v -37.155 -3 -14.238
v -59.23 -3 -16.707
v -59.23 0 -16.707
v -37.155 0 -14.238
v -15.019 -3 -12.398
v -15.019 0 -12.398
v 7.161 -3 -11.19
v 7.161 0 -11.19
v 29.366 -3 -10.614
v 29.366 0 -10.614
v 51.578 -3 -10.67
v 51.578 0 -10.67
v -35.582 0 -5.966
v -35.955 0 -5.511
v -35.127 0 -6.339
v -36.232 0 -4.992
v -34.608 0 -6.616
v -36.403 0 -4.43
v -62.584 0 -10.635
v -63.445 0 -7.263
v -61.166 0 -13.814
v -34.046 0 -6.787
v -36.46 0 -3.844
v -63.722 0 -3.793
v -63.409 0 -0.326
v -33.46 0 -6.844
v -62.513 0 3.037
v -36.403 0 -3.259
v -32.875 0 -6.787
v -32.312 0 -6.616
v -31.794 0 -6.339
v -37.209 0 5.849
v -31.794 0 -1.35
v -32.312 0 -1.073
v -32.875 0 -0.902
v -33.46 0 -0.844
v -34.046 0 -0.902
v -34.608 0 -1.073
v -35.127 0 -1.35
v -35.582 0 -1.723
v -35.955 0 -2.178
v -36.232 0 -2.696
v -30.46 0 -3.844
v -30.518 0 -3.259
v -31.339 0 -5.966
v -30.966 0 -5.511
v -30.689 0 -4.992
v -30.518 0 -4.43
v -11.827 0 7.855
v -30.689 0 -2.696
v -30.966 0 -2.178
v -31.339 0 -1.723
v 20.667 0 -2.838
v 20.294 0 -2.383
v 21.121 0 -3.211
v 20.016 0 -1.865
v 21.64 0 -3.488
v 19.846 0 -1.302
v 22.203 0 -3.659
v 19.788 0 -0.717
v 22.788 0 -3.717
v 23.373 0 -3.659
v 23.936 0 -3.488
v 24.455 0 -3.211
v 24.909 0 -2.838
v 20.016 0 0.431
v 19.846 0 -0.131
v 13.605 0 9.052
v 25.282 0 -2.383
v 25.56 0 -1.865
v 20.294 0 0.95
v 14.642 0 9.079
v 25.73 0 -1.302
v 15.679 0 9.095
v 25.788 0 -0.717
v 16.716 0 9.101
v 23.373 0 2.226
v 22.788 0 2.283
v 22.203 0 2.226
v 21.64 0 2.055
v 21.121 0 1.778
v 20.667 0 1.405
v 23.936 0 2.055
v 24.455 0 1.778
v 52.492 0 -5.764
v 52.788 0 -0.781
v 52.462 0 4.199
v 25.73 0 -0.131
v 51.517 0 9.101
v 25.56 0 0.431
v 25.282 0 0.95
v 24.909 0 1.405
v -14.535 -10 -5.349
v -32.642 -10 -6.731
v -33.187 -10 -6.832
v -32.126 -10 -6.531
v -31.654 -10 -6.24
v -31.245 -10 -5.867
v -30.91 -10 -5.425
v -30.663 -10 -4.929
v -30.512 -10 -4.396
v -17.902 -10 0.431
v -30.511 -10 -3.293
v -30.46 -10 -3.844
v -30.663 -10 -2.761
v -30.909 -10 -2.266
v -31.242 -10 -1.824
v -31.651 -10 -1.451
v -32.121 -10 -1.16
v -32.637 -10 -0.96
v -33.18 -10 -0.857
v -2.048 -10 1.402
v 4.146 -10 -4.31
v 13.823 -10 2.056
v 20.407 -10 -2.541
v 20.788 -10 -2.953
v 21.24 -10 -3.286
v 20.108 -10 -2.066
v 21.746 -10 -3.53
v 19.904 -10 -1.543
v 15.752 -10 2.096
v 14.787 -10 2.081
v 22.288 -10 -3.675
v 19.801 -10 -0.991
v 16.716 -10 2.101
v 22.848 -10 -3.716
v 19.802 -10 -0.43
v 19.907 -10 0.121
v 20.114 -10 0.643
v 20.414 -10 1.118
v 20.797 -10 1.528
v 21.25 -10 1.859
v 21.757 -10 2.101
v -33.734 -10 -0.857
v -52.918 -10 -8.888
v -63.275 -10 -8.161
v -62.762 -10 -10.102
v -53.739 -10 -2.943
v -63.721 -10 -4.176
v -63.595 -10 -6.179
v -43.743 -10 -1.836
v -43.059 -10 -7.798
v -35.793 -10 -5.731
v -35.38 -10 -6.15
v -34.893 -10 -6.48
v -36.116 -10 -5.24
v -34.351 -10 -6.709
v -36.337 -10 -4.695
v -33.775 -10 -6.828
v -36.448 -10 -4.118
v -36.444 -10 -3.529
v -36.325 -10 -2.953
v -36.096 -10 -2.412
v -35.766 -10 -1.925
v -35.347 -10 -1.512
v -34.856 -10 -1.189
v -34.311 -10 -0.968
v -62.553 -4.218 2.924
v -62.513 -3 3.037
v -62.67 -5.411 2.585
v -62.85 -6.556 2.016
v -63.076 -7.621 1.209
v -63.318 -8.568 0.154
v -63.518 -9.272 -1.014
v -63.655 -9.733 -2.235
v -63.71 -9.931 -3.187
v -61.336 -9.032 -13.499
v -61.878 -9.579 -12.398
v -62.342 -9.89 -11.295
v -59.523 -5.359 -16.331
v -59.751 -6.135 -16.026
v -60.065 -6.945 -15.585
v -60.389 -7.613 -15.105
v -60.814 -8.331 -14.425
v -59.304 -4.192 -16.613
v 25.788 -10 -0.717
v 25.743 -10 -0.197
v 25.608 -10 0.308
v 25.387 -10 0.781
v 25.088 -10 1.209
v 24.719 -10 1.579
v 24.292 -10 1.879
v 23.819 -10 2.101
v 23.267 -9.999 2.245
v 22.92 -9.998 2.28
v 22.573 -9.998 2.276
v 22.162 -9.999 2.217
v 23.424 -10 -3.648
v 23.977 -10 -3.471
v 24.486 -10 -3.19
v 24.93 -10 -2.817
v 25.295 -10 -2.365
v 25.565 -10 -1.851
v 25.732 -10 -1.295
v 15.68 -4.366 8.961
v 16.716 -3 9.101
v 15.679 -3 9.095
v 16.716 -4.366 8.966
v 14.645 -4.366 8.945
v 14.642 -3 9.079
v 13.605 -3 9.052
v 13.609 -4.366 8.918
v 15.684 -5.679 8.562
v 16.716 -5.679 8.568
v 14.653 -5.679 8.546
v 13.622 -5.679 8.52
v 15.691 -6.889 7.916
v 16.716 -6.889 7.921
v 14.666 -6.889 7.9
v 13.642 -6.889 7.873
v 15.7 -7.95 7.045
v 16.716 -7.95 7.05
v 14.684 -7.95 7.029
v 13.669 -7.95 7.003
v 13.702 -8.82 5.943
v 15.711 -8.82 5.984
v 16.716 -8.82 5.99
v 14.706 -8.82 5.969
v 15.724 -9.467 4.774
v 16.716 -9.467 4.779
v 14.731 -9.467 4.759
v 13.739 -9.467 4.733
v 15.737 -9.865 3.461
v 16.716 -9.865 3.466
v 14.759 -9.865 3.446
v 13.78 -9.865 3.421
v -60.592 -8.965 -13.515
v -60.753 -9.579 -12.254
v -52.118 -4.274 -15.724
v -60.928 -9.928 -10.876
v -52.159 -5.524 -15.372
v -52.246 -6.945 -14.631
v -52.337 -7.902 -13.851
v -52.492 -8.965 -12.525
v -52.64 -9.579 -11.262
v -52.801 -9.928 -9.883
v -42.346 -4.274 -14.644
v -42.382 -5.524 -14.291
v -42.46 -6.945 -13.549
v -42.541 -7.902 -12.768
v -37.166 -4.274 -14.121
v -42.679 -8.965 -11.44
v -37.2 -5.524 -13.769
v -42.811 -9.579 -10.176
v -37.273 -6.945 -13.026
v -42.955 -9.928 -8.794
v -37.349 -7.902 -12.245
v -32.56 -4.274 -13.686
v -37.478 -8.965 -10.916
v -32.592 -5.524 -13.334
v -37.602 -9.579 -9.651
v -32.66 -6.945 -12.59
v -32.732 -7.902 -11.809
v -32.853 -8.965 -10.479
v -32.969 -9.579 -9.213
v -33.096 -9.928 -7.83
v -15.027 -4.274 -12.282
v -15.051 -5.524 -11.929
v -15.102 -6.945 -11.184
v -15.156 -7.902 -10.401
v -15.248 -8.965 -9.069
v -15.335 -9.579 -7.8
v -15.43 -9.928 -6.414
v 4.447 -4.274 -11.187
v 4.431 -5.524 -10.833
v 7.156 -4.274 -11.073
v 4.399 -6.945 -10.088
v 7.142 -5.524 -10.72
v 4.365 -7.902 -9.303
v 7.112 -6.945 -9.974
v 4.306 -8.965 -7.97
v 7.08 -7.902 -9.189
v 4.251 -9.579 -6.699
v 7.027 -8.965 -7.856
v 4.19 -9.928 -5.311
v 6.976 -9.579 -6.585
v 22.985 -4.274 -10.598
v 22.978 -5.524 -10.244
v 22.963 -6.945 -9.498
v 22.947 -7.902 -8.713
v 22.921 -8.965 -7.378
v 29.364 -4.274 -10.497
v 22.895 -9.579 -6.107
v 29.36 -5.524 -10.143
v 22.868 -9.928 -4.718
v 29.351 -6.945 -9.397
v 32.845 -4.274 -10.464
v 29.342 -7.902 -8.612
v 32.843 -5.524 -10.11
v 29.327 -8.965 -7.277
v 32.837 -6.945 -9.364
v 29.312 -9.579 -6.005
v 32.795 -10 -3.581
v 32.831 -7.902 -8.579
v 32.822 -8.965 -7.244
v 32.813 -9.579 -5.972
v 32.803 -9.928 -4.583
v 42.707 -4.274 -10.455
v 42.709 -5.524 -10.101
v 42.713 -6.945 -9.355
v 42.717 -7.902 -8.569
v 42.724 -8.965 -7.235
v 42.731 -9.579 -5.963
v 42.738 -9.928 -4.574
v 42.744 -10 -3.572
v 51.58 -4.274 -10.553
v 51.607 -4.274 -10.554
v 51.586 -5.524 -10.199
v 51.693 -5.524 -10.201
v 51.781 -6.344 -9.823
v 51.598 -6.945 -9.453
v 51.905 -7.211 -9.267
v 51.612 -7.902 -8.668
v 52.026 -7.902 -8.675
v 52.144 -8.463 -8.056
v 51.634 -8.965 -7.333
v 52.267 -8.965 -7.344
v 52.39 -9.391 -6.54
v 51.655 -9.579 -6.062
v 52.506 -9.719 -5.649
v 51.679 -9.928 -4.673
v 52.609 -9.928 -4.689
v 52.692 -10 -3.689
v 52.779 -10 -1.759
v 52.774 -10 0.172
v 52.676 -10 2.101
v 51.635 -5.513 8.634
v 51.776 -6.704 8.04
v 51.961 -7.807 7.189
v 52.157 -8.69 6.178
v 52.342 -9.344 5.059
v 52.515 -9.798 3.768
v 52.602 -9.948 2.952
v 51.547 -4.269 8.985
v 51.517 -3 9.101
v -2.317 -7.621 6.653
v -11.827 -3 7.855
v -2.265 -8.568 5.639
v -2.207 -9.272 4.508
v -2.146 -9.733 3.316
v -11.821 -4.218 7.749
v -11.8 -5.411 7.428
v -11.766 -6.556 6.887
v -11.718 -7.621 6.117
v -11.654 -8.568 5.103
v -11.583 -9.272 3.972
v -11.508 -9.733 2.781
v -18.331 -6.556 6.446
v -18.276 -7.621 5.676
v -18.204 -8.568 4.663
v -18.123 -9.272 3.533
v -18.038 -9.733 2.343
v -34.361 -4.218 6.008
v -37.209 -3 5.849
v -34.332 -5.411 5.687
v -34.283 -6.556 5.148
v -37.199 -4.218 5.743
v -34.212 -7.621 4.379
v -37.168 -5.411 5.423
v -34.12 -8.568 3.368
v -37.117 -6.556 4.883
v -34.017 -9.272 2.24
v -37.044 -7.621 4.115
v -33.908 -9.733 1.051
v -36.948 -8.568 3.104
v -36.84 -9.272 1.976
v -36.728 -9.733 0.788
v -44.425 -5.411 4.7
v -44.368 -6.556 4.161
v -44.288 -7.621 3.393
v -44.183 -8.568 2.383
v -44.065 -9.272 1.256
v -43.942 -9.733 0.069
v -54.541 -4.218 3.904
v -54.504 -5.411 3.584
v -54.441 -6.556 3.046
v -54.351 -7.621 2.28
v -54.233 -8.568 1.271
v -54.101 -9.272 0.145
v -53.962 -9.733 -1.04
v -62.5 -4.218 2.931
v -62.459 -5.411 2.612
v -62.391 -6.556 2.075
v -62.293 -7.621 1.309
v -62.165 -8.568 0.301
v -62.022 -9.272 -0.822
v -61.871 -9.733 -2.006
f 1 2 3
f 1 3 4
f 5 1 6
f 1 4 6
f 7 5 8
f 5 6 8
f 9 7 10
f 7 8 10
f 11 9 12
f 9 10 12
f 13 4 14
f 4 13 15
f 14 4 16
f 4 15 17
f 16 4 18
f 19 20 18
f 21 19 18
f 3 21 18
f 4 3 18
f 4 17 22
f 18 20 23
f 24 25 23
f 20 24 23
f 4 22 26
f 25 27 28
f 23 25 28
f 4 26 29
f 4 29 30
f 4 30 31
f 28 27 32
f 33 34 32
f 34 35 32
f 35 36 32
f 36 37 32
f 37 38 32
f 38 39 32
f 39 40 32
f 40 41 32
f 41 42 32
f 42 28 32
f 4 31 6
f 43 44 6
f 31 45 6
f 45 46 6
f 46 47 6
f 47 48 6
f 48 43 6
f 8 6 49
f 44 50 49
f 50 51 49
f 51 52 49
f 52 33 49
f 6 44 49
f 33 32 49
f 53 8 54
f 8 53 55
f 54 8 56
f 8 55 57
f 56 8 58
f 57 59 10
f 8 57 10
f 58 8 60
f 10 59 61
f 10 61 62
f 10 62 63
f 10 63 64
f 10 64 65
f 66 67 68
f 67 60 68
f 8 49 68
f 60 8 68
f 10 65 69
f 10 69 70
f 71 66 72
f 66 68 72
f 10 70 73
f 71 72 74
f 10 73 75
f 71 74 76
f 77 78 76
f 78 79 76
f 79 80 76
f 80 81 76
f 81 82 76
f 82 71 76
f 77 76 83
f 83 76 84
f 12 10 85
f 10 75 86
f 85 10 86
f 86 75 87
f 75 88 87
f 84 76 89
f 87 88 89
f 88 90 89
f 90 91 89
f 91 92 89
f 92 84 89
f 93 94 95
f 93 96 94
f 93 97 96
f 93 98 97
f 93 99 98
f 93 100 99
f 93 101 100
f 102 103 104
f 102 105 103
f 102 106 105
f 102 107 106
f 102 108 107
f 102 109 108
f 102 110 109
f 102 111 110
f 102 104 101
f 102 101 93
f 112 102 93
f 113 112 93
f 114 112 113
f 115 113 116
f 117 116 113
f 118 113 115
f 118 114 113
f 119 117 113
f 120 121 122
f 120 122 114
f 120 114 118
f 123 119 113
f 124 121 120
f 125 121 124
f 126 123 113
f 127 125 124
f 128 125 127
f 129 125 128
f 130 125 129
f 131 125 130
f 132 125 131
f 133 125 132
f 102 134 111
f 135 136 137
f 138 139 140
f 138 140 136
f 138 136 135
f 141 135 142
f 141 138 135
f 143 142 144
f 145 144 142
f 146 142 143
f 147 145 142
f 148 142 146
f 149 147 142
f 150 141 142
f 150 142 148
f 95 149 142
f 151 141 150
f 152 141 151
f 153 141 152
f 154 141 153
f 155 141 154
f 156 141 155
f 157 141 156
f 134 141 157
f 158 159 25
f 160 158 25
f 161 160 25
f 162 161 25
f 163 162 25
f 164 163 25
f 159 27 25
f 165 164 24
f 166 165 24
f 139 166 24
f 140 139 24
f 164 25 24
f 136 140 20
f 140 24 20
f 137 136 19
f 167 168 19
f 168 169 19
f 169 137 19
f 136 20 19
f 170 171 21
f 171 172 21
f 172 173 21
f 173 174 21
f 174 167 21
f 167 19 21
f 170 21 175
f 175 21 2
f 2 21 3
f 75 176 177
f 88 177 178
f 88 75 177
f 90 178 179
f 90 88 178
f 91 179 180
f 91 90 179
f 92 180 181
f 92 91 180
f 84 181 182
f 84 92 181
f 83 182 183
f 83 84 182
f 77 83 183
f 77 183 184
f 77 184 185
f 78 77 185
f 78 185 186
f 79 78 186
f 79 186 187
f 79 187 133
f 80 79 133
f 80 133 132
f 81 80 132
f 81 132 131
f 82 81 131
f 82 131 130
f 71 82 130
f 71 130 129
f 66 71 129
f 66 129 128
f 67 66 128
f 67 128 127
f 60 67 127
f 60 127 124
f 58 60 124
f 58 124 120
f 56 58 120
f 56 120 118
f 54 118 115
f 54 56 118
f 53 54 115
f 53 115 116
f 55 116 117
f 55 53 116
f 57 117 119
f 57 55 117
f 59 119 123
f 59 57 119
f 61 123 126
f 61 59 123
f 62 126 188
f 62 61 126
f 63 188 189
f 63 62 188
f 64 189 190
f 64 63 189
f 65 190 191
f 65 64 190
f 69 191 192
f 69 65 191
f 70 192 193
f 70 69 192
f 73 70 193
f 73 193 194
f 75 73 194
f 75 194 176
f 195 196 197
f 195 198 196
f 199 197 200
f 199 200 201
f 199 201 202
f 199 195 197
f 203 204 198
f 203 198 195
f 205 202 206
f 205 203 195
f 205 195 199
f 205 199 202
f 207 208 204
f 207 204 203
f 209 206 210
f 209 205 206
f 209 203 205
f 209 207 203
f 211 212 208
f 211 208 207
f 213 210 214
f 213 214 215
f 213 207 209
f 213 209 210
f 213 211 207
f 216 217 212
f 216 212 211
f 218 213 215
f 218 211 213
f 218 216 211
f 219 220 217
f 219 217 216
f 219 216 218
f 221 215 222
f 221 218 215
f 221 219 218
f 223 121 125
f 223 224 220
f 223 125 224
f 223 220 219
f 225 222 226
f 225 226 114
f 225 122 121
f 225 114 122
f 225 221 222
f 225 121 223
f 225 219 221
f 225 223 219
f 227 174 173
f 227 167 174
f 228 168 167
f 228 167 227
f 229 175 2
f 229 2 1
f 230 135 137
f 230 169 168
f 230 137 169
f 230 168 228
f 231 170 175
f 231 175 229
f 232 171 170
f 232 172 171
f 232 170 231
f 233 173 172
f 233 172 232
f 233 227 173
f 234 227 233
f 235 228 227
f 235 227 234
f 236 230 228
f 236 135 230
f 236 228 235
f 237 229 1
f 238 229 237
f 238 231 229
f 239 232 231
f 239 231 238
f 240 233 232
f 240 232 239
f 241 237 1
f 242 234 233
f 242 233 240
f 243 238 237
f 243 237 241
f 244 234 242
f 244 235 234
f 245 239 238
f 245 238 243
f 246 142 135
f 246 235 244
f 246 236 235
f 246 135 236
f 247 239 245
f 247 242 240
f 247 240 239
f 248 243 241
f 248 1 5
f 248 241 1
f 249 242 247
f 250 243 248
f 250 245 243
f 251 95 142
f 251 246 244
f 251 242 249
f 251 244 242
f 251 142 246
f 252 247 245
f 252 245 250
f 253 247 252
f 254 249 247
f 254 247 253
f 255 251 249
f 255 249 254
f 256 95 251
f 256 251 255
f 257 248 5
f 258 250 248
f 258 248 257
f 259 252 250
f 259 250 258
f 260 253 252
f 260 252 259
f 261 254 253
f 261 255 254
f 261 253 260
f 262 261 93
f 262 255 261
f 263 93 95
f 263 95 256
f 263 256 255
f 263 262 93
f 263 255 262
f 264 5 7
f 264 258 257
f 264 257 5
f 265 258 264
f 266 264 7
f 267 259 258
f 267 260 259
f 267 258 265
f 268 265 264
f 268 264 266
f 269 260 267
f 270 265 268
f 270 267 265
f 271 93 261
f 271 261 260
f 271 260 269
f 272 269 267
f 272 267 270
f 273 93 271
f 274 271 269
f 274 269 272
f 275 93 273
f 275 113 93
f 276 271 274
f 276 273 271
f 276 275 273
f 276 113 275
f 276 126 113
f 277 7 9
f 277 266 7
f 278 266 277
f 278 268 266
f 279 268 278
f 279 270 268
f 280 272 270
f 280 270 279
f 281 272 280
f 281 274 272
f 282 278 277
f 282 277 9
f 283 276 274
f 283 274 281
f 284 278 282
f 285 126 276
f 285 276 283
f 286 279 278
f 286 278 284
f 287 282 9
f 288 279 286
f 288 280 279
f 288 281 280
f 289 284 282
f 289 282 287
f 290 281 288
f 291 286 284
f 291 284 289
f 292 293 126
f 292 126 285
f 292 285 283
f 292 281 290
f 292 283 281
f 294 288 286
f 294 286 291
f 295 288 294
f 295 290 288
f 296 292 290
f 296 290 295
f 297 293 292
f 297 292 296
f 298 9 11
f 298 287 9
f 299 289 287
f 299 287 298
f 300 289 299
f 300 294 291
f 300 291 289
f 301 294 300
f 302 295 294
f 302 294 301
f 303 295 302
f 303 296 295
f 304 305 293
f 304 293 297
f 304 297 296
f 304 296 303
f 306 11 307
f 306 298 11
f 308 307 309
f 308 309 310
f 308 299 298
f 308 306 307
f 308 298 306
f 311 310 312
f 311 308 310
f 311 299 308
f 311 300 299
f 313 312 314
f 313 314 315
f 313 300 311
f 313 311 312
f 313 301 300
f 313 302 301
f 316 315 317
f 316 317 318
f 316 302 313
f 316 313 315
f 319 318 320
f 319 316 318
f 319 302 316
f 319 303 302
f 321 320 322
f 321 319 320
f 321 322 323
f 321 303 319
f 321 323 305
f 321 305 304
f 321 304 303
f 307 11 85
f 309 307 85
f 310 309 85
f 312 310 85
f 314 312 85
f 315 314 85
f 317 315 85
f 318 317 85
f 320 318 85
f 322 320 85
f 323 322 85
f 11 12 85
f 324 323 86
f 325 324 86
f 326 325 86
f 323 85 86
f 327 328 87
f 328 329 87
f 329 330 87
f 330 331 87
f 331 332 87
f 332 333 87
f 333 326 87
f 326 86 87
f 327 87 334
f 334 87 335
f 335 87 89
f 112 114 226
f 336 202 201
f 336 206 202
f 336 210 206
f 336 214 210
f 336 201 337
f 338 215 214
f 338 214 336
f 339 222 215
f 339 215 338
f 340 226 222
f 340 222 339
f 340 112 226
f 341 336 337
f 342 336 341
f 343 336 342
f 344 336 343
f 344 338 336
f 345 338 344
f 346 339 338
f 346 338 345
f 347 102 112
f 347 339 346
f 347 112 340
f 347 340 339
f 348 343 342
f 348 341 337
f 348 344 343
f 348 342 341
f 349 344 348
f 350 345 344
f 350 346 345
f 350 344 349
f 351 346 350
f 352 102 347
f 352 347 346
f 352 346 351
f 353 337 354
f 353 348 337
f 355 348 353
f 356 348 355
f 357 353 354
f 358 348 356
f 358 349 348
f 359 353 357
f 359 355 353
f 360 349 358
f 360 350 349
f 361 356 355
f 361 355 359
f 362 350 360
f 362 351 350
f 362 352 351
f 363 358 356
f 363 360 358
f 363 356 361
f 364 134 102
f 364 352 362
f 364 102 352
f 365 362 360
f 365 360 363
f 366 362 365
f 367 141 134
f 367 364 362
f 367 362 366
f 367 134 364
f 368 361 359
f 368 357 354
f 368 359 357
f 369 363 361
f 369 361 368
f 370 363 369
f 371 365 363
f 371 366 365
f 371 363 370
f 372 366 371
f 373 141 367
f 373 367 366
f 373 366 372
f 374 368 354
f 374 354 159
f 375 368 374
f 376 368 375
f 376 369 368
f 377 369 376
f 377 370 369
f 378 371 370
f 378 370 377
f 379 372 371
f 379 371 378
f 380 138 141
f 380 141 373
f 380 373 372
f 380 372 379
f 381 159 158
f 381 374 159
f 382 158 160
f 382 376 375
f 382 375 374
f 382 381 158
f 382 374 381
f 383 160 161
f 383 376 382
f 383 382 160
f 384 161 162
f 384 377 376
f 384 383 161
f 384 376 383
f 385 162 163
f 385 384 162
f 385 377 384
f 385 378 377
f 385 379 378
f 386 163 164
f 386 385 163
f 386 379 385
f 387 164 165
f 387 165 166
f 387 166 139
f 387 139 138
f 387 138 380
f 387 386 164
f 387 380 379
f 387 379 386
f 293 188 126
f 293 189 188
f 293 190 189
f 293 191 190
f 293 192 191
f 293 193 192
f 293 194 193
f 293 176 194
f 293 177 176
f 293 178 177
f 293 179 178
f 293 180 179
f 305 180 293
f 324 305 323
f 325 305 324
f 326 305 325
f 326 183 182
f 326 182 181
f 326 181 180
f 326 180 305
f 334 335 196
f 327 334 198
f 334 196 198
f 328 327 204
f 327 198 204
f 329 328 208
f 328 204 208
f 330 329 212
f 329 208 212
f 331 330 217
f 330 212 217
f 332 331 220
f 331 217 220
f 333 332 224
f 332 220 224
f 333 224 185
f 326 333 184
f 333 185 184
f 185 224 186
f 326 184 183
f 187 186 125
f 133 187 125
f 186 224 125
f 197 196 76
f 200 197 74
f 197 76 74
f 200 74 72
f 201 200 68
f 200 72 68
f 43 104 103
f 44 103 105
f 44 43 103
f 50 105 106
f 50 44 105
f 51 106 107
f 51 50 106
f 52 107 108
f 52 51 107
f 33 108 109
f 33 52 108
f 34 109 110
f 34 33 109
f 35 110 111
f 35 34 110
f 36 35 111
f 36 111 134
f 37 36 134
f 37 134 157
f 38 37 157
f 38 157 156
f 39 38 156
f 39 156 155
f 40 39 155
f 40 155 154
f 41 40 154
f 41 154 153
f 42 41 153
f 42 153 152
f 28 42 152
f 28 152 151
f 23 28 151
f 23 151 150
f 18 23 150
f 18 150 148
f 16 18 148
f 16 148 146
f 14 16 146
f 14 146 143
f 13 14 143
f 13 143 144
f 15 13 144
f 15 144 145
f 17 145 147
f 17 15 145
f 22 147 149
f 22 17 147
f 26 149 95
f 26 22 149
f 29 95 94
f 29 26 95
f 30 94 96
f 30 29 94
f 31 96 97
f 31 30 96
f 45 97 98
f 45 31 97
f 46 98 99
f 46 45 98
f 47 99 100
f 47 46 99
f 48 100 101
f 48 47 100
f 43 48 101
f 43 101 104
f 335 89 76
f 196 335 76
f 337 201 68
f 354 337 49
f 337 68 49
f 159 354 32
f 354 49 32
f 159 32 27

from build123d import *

# Parameters (mm, degrees)
F0_R        = 3
F1_DEPTH    = 10
F2_T1_DEPTH = 52.3011751173
F2_T4_ANGLE = 6.7239804363
F2_T6_ANGLE = 10.729424982
F2_T8_ANGLE = 1.7828949869


# Not quite as in the source:
# - a fillet or chamfer that OpenCascade refuses, or shapes differently, is made with other operations: its cross-section is extruded or revolved along the edge and cut away or added


with BuildPart() as f1:
    # F0 (on Front) → F1 (new body)
    with BuildSketch(Plane.XZ):
        with BuildLine():
            ThreePointArc((16.7161625637, 9.1005522793), (15.1603559483, 9.0884488757), (13.604925944, 9.0521415948))
            ThreePointArc((13.604925944, 9.0521415948), (-24.5259537531, 6.9533029462), (-62.5132279063, 3.0371680453))
            ThreePointArc((-62.5132279063, 3.0371680453), (-63.4446975244, -7.2627028514), (-59.2295458713, -16.7066147888))
            ThreePointArc((-59.2295458713, -16.7066147888), (-3.9332598443, -11.7153648591), (51.5779973344, -10.6703047235))
            ThreePointArc((51.5779973344, -10.6703047235), (52.7884384629, -0.7810693697), (51.517337681, 9.1005522793))
            Line((51.517337681, 9.1005522793), (16.7161625637, 9.1005522793))
        make_face()
        with Locations((-33.4603461426, -3.8443253384)):
            Circle(F0_R, mode=Mode.SUBTRACT)
        with Locations((22.7880547631, -0.7167291473)):
            Circle(F0_R, mode=Mode.SUBTRACT)
    extrude(amount=F1_DEPTH)

    # F2: fillet of radius 7 on 4 edges, made by hand

    # F2_s2 → F2_t1 (cut)
    with BuildSketch(Plane.YZ.offset(16.7161625637)):
        with BuildLine():
            ThreePointArc((-3, 9.1005522793), (-7.9497474683, 7.0502997476), (-10, 2.1005522793))
            Line((-10, 2.1005522793), (-10, 9.1005522793))
            Line((-10, 9.1005522793), (-3, 9.1005522793))
        make_face()
    extrude(amount=F2_T1_DEPTH, mode=Mode.SUBTRACT)

    # F2_s3 → F2_t4 (revolve, cut)
    with BuildSketch(Plane(origin=(13.8732538603, 0, 0.4318388106), x_dir=(0, 1, 0), z_dir=(0.9995158932, 0, 0.0311123662))):
        with BuildLine():
            ThreePointArc((-3, 8.624477953), (-7.9497474683, 6.5742254213), (-10, 1.624477953))
            Line((-10, 1.624477953), (-10, 8.624477953))
            Line((-10, 8.624477953), (-3, 8.624477953))
        make_face()
    revolve(axis=Axis((38.4948189015, -10, -790.5605729296), (0, -1, 0)), revolution_arc=F2_T4_ANGLE, mode=Mode.SUBTRACT)

    # F2_s5 → F2_t6 (revolve, cut)
    with BuildSketch(Plane(origin=(-77.6853434409, 0, -11.5863862591), x_dir=(0, 1, 0), z_dir=(-0.9890600521, 0, -0.1475134342))):
        with BuildLine():
            ThreePointArc((-3, 7.5903844134), (-7.9497474683, 5.5401318817), (-10, 0.5903844134))
            Line((-10, 0.5903844134), (-10, 7.5903844134))
            Line((-10, 7.5903844134), (-3, 7.5903844134))
        make_face()
    revolve(axis=Axis((38.4948189015, -10, -790.5605729293), (0, 1, 0)), revolution_arc=F2_T6_ANGLE, mode=Mode.SUBTRACT)

    # F2_s7 → F2_t8 (revolve, cut)
    with BuildSketch(Plane.YZ.offset(16.7161625637)):
        with BuildLine():
            ThreePointArc((-3, 9.1005522793), (-7.9497474683, 7.0502997476), (-10, 2.1005522793))
            Line((-10, 2.1005522793), (-10, 9.1005522793))
            Line((-10, 9.1005522793), (-3, 9.1005522793))
        make_face()
    revolve(axis=Axis((16.7161625637, -10, -90.8994477206), (0, -1, 0)), revolution_arc=F2_T8_ANGLE, mode=Mode.SUBTRACT)


solid = f1.part
